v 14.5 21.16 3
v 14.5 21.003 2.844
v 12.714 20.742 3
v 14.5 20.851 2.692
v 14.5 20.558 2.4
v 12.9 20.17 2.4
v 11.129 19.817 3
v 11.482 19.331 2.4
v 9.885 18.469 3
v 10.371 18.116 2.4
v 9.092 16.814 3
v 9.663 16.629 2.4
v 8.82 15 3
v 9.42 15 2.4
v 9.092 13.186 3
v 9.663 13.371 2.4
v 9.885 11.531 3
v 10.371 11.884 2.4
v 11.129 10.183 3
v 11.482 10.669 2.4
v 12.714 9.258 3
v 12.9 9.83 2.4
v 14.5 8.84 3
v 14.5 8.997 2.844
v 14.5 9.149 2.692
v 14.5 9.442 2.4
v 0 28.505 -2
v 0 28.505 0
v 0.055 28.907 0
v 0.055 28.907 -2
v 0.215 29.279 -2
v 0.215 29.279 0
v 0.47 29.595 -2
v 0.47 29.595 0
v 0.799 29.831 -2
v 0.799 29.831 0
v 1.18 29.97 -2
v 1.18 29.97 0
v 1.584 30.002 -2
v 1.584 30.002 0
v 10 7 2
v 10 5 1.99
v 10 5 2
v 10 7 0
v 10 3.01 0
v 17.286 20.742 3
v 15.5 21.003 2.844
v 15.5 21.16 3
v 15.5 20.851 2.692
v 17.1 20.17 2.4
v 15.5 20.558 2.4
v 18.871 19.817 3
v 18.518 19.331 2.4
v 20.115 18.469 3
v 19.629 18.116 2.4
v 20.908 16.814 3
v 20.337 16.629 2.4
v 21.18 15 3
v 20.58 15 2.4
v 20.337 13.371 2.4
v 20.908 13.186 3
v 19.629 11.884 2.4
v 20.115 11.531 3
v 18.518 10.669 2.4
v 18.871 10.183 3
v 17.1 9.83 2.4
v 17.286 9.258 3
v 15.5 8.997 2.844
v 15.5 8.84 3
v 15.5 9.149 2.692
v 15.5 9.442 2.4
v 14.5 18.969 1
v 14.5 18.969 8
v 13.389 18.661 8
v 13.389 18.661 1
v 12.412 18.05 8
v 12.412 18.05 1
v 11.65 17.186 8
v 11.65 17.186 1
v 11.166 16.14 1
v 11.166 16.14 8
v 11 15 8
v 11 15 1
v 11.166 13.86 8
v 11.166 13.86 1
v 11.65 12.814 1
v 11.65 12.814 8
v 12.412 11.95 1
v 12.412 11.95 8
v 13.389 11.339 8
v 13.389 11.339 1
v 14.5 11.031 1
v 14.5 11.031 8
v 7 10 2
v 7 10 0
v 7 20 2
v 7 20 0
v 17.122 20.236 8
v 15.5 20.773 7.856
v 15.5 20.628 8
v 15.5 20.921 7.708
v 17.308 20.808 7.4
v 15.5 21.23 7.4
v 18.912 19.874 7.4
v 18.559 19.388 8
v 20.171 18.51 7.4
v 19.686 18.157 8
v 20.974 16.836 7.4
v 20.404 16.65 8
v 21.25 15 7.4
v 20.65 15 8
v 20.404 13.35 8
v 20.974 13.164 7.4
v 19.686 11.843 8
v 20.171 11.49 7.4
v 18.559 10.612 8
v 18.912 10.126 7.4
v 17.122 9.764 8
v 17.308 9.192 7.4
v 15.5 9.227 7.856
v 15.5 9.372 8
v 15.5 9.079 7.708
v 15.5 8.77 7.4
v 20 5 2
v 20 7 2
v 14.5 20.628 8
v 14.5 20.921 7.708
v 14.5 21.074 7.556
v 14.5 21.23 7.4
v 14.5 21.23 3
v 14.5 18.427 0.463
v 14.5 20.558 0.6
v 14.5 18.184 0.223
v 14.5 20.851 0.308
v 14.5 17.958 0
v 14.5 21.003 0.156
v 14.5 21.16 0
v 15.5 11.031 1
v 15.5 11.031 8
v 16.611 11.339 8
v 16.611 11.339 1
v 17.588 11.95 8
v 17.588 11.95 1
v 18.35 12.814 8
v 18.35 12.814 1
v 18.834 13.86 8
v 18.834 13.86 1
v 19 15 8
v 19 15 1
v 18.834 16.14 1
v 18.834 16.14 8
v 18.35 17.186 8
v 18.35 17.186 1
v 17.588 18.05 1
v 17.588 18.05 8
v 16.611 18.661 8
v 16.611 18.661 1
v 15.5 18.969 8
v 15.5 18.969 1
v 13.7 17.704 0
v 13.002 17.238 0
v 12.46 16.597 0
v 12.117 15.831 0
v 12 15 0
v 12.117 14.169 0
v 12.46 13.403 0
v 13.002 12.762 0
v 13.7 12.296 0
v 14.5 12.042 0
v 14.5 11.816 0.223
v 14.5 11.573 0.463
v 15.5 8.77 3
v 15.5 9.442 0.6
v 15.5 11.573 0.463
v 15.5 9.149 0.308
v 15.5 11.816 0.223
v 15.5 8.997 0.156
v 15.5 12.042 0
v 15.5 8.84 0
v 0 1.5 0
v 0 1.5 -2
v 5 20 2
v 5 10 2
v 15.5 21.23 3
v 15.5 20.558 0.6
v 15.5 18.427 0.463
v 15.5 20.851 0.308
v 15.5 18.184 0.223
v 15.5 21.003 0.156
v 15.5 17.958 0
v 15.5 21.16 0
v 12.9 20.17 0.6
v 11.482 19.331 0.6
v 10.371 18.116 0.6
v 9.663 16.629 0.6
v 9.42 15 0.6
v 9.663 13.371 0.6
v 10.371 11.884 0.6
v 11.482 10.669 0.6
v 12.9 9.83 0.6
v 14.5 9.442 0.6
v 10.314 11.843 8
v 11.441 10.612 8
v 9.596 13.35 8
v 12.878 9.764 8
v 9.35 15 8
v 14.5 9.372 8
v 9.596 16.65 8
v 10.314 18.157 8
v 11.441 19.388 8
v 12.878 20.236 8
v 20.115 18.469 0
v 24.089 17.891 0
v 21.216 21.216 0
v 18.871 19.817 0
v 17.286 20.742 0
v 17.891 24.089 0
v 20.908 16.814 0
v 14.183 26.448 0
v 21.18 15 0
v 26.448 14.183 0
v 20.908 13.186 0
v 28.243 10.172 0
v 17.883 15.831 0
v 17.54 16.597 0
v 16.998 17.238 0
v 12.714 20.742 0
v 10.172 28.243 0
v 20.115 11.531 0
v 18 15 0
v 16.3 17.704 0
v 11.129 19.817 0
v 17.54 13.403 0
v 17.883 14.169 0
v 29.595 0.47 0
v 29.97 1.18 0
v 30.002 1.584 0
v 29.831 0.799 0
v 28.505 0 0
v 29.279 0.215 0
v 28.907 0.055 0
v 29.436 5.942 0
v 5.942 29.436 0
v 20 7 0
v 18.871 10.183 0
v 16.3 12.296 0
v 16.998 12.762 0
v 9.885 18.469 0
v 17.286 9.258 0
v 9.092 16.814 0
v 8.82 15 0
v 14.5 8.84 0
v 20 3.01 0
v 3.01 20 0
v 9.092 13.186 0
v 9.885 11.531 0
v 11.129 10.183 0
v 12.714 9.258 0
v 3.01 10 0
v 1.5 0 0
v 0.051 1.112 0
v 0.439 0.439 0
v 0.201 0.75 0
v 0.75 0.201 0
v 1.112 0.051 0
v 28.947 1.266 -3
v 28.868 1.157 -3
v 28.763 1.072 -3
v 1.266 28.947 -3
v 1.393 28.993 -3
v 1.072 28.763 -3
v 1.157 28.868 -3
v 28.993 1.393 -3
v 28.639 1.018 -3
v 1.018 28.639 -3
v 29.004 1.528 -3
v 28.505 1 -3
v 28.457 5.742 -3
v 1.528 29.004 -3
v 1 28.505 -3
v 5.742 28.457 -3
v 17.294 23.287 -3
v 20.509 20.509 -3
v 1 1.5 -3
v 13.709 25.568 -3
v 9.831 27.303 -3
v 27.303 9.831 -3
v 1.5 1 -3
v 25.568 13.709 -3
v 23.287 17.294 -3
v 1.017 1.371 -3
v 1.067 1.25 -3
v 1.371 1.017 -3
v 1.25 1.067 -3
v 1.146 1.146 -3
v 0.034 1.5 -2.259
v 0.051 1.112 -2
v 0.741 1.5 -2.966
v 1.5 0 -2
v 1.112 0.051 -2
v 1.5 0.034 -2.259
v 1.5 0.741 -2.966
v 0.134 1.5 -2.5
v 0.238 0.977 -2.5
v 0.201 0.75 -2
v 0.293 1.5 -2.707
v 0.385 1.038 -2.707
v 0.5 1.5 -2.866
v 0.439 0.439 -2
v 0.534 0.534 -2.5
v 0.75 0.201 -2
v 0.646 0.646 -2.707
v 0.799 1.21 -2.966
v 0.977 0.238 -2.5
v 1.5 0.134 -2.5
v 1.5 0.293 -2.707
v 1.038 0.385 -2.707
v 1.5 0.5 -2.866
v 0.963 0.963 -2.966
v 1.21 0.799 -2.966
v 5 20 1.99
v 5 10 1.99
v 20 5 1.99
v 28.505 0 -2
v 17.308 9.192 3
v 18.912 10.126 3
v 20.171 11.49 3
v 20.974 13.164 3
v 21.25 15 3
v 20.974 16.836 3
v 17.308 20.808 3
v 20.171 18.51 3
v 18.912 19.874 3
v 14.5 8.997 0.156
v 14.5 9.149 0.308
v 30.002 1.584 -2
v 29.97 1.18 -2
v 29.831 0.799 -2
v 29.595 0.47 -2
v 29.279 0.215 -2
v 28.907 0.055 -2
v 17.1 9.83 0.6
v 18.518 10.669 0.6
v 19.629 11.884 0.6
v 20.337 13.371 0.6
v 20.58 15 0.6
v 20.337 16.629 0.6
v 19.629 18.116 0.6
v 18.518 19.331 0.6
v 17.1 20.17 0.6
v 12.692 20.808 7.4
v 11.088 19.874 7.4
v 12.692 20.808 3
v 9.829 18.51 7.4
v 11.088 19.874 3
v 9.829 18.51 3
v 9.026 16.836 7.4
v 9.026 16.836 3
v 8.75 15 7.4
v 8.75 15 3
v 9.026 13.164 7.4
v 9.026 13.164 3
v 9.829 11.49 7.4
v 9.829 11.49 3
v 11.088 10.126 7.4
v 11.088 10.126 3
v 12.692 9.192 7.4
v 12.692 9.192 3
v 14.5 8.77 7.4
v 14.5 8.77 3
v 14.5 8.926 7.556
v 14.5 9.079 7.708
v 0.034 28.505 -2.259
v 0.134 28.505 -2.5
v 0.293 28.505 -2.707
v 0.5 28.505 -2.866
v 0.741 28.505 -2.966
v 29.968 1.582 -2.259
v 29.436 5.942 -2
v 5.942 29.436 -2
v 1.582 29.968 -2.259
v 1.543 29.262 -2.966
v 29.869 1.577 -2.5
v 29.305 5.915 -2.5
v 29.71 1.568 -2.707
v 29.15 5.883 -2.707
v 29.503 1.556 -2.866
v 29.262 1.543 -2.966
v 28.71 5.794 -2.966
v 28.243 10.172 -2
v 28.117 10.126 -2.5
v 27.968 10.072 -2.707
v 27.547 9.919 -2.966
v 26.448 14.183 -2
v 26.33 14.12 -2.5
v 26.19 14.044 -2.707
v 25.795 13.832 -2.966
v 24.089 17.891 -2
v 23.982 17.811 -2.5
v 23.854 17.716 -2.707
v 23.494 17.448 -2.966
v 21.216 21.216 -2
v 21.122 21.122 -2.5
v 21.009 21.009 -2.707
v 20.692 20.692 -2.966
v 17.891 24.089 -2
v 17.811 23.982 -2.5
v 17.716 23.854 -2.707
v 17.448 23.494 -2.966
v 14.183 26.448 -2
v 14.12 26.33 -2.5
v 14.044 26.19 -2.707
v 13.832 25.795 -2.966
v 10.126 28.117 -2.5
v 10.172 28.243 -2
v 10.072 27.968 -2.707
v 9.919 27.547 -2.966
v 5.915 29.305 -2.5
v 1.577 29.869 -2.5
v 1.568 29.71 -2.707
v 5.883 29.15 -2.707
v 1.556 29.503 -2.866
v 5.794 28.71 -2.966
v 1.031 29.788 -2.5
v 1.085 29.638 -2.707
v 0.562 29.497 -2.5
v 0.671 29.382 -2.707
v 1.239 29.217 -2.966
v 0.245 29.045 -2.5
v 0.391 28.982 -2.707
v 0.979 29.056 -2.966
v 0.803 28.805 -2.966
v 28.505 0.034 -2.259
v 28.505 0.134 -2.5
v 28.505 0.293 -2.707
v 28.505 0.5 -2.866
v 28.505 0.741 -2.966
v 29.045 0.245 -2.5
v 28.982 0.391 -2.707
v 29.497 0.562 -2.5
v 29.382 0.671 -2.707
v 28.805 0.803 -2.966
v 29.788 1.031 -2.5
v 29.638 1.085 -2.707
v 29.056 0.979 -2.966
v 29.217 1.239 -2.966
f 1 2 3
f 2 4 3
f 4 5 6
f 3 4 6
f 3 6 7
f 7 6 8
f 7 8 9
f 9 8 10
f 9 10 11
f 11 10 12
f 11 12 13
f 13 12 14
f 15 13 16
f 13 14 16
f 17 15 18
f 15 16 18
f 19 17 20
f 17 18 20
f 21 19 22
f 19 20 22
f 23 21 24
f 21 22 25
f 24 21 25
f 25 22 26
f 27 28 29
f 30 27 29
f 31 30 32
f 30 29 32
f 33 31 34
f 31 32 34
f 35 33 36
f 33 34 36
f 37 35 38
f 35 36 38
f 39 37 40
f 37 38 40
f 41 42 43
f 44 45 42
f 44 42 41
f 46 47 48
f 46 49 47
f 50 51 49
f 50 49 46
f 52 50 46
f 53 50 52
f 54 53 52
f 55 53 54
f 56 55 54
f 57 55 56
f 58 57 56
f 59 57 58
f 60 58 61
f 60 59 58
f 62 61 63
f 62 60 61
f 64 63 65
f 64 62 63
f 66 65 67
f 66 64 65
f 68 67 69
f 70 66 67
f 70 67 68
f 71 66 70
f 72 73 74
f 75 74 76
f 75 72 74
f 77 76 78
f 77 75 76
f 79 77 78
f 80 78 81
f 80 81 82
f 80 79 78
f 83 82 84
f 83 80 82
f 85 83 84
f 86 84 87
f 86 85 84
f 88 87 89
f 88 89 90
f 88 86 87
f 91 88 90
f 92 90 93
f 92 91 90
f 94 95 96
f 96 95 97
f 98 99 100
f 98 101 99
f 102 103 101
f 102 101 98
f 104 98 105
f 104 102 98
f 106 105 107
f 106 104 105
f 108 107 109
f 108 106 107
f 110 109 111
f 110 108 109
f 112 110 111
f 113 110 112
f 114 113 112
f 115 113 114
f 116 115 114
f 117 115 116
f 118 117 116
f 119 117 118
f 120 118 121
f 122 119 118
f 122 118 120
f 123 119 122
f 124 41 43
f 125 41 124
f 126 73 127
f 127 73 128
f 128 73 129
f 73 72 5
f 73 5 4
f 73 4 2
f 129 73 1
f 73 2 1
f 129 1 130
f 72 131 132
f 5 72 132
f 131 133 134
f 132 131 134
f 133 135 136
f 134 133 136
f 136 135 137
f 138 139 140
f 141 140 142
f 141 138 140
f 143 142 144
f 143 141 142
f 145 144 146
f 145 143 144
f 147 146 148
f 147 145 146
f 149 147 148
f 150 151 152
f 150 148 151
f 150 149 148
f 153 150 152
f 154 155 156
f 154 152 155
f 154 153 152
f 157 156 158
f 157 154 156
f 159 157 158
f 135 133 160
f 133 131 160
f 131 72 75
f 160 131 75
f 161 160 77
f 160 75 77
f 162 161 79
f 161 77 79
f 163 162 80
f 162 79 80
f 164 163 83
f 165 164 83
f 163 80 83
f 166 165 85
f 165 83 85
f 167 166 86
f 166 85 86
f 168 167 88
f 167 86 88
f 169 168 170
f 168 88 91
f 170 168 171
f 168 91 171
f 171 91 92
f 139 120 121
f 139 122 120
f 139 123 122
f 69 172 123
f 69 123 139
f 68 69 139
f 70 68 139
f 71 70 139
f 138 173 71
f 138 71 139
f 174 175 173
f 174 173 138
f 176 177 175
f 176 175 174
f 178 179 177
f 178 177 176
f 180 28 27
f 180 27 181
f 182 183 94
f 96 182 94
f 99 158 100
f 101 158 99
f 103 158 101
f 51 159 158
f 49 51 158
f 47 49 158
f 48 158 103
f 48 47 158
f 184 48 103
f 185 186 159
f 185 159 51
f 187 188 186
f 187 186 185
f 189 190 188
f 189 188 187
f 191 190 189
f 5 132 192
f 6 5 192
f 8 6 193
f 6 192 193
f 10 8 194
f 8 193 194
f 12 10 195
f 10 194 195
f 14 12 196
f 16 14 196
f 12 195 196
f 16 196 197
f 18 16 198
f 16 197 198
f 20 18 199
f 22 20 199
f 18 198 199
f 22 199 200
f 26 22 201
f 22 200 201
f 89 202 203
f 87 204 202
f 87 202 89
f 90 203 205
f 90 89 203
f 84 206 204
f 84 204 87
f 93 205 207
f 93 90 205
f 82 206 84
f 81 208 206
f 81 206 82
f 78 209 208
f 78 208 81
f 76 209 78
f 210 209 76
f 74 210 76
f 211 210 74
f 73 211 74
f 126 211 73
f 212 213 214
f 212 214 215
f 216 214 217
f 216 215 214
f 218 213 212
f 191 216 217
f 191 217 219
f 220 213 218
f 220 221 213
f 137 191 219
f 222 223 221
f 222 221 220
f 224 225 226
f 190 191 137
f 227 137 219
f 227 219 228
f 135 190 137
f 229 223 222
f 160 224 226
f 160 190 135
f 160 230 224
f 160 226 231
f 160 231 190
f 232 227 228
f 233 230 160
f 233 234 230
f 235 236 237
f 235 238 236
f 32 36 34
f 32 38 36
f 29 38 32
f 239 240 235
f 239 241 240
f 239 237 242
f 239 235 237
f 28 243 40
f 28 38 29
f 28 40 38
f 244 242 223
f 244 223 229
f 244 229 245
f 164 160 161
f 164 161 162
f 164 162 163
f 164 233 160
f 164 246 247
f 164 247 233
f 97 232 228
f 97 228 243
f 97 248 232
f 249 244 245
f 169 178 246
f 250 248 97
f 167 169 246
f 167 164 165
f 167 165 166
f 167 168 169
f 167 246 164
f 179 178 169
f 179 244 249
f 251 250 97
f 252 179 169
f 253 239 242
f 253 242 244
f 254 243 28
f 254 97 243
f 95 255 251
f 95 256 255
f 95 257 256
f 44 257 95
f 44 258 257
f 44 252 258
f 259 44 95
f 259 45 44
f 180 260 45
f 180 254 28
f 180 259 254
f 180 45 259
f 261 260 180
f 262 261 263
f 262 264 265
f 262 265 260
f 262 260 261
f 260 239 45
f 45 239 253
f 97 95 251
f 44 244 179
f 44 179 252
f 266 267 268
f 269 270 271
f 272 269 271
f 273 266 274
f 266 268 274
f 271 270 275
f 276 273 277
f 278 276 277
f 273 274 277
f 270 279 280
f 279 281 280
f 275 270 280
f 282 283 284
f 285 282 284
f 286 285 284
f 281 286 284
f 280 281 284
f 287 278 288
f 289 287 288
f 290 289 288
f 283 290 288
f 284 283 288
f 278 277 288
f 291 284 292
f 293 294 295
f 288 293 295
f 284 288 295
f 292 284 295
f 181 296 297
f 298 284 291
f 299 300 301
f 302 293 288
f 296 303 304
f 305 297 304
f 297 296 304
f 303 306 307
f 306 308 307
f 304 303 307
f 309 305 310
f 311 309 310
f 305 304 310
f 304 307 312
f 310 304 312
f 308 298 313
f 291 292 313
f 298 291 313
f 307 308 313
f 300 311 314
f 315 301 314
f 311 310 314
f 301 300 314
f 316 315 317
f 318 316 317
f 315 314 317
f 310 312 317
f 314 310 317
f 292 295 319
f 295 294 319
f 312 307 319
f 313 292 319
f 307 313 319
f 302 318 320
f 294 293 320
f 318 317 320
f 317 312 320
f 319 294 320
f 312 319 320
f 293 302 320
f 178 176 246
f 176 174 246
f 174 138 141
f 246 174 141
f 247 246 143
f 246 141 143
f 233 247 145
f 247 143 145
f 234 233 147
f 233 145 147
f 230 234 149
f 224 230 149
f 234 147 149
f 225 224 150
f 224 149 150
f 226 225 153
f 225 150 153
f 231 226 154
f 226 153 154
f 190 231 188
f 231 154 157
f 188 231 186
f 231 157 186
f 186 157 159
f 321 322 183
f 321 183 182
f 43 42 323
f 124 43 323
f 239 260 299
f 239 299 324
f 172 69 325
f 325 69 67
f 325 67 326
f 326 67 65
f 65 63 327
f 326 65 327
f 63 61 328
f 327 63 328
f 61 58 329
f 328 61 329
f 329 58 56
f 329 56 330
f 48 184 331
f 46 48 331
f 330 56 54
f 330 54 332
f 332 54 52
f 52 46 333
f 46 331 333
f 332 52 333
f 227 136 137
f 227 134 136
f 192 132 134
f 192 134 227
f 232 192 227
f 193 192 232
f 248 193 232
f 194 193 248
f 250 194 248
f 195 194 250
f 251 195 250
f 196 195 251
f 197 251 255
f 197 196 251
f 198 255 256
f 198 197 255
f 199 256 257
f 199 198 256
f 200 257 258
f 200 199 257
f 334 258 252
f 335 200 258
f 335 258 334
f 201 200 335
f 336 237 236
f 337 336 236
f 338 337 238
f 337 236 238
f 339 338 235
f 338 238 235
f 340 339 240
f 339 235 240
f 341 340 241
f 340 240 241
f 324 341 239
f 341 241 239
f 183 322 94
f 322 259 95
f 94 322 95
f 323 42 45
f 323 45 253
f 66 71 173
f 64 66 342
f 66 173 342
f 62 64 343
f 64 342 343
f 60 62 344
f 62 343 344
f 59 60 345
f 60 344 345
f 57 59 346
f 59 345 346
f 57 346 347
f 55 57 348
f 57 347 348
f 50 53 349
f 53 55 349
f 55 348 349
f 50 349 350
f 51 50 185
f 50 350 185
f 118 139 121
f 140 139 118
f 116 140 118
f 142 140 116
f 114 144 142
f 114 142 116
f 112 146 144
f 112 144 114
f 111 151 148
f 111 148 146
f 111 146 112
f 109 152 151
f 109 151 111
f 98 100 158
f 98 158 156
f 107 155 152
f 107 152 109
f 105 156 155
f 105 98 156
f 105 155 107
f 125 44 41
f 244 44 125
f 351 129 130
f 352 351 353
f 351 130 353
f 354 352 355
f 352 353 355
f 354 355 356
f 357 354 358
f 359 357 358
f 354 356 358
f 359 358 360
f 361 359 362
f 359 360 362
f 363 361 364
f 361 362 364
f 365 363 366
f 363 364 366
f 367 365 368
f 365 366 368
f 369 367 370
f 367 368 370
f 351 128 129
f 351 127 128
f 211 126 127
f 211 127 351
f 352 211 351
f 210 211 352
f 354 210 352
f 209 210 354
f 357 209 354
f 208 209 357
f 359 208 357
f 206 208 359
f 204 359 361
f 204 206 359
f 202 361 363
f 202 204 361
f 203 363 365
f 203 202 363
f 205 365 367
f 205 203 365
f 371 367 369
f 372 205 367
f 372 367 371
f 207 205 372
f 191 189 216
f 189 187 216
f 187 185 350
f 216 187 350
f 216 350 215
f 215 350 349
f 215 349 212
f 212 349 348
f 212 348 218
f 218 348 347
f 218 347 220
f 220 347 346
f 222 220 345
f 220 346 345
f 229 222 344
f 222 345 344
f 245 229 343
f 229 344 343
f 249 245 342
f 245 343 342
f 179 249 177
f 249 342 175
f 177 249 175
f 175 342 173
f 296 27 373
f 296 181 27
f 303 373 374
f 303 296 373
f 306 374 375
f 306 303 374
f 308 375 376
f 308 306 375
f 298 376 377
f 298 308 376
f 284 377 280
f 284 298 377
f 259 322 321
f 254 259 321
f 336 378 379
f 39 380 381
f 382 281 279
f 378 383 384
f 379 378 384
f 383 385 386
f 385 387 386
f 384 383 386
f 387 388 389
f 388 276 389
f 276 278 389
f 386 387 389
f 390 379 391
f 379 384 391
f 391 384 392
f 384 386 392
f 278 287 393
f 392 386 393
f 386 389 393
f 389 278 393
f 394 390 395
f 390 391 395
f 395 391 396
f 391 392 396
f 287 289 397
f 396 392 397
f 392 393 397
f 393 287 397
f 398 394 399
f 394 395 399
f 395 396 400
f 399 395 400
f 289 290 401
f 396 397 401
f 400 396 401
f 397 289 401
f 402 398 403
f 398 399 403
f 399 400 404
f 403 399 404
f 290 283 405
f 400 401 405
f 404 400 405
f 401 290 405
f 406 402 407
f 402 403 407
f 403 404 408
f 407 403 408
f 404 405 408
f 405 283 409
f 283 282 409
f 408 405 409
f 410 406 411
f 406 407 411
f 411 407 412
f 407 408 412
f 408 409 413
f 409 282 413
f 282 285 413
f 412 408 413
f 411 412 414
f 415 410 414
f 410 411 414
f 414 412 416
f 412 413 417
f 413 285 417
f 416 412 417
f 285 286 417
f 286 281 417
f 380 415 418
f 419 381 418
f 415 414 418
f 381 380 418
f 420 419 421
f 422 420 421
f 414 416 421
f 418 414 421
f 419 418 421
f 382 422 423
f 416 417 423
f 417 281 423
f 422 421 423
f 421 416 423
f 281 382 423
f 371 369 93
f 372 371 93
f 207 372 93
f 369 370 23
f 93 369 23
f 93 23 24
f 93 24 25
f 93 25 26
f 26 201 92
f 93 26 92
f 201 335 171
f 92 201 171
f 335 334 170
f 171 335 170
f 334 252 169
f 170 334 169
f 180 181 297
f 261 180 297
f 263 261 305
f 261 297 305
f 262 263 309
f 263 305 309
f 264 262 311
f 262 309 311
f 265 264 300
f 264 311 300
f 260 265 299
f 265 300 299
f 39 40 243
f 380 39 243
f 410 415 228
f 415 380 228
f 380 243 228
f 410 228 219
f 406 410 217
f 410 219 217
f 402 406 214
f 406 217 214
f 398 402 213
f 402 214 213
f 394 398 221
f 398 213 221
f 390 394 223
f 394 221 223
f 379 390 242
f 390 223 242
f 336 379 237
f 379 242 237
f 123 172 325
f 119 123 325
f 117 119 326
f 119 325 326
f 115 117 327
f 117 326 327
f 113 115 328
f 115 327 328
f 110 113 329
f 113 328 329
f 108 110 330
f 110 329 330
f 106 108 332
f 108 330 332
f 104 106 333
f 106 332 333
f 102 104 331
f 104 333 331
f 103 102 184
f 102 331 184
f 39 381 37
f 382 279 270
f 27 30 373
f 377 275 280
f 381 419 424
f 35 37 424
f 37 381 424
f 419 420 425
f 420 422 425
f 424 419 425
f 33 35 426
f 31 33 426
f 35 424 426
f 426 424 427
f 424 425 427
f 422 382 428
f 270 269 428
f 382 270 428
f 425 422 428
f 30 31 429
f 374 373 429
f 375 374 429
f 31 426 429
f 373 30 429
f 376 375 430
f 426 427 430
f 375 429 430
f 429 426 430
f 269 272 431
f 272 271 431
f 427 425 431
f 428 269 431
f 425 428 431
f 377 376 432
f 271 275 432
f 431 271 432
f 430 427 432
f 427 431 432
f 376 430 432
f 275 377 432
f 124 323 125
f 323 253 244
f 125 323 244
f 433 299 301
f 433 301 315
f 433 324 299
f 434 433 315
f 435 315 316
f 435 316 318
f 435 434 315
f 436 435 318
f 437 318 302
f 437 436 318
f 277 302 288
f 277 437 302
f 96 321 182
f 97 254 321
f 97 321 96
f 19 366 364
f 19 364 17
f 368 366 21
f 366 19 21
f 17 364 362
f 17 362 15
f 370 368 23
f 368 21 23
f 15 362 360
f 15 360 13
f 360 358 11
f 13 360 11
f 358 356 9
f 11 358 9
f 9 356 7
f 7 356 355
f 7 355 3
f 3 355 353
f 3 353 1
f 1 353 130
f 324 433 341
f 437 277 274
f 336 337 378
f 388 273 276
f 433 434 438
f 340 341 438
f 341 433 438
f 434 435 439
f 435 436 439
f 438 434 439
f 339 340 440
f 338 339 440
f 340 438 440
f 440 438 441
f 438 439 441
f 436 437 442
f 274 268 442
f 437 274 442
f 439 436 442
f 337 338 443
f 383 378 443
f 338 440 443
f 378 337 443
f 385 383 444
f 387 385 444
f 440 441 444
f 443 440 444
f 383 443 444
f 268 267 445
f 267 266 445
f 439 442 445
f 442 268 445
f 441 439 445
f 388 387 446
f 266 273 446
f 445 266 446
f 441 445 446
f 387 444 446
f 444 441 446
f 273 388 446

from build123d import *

# Parameters (mm, degrees)
SKETCH_R        = 6.25
SKETCH_R_2      = 4
PAD_DEPTH       = 8
PAD001_DEPTH    = 3
FILLET_R        = 1.5
FILLET001_R     = 1
SKETCH002_W     = 2
SKETCH002_H     = 10
SKETCH002_W_2   = 10
SKETCH002_H_2   = 2
PAD002_DEPTH    = 2
CHAMFER_SIZE    = 1.99
SKETCH003_R     = 6.26
SKETCH003_R_2   = 5.58
POCKET_DEPTH    = 3
SKETCH004_W     = 1
SKETCH004_H     = 14
POCKET001_DEPTH = 20
CHAMFER001_SIZE = 0.6
CHAMFER002_SIZE = 1


with BuildPart() as part:
    # Sketch → Pad (new body)
    with BuildSketch(Plane.XY):
        with Locations((15, 15)):
            Circle(SKETCH_R)
        with Locations((15, 15)):
            Circle(SKETCH_R_2, mode=Mode.SUBTRACT)
    extrude(amount=PAD_DEPTH)

    # Sketch001 (on Face3 of Pad) → Pad001 (join)
    with BuildSketch(Plane(origin=(0, 0, 0), x_dir=(1, 0, 0), z_dir=(0, 0, -1))):
        with BuildLine():
            Line((0, -28.504743), (0, 0))
            Line((0, 0), (28.504743, 0))
            ThreePointArc((30.002374, -1.584264), (29.594788, -0.469562), (28.504743, 0))
            ThreePointArc((1.584264, -30.002374), (21.216341, -21.216341), (30.002374, -1.584264))
            ThreePointArc((0, -28.504743), (0.469562, -29.594788), (1.584264, -30.002374))
        make_face()
    extrude(amount=PAD001_DEPTH)

    # Fillet
    fillet_edges = [part.edges().sort_by_distance(p)[0] for p in [
        (0, 0, -1.5),
    ]]
    fillet(fillet_edges, radius=FILLET_R)

    # Fillet001
    fillet001_edges = [part.edges().sort_by_distance(p)[0] for p in [
        (0, 15.002371, -3),
        (0.43934, 0.43934, -3),
        (0.469562, 29.594788, -3),
        (15.002371, 0, -3),
        (21.216341, 21.216341, -3),
        (29.594788, 0.469562, -3),
    ]]
    fillet(fillet001_edges, radius=FILLET001_R)

    # Sketch002 (on Face4 of Fillet001) → Pad002 (join)
    with BuildSketch(Plane.XY):
        with Locations((6, 15)):
            Rectangle(SKETCH002_W, SKETCH002_H)
        with Locations((15, 6)):
            Rectangle(SKETCH002_W_2, SKETCH002_H_2)
    extrude(amount=PAD002_DEPTH)

    # Chamfer
    chamfer_edges = [part.edges().sort_by_distance(p)[0] for p in [
        (15, 5, 0),
        (5, 15, 0),
    ]]
    chamfer(chamfer_edges, length=CHAMFER_SIZE)

    # Sketch003 → Pocket (cut)
    with BuildSketch(Plane.XY):
        with Locations((15, 15)):
            Circle(SKETCH003_R)
        with Locations((15, 15)):
            Circle(SKETCH003_R_2, mode=Mode.SUBTRACT)
    extrude(amount=POCKET_DEPTH, mode=Mode.SUBTRACT)

    # Sketch004 (on Face1 of Pocket) → Pocket001 (cut)
    with BuildSketch(Plane.XY):
        with Locations((15, 15)):
            Rectangle(SKETCH004_W, SKETCH004_H)
    extrude(amount=POCKET001_DEPTH, mode=Mode.SUBTRACT)

    # Chamfer001
    chamfer001_edges = [part.edges().sort_by_distance(p)[0] for p in [
        (19.118641, 11.235269, 0),
        (9.42, 15, 0),
        (9.42, 15, 3),
        (19.118641, 11.235269, 3),
        (8.75, 15, 8),
        (19.592793, 10.761044, 8),
    ]]
    chamfer(chamfer001_edges, length=CHAMFER001_SIZE)

    # Chamfer002
    chamfer002_edges = [part.edges().sort_by_distance(p)[0] for p in [
        (11, 15, 0),
        (18, 17.645751, 0),
    ]]
    chamfer(chamfer002_edges, length=CHAMFER002_SIZE)


solid = part.part
